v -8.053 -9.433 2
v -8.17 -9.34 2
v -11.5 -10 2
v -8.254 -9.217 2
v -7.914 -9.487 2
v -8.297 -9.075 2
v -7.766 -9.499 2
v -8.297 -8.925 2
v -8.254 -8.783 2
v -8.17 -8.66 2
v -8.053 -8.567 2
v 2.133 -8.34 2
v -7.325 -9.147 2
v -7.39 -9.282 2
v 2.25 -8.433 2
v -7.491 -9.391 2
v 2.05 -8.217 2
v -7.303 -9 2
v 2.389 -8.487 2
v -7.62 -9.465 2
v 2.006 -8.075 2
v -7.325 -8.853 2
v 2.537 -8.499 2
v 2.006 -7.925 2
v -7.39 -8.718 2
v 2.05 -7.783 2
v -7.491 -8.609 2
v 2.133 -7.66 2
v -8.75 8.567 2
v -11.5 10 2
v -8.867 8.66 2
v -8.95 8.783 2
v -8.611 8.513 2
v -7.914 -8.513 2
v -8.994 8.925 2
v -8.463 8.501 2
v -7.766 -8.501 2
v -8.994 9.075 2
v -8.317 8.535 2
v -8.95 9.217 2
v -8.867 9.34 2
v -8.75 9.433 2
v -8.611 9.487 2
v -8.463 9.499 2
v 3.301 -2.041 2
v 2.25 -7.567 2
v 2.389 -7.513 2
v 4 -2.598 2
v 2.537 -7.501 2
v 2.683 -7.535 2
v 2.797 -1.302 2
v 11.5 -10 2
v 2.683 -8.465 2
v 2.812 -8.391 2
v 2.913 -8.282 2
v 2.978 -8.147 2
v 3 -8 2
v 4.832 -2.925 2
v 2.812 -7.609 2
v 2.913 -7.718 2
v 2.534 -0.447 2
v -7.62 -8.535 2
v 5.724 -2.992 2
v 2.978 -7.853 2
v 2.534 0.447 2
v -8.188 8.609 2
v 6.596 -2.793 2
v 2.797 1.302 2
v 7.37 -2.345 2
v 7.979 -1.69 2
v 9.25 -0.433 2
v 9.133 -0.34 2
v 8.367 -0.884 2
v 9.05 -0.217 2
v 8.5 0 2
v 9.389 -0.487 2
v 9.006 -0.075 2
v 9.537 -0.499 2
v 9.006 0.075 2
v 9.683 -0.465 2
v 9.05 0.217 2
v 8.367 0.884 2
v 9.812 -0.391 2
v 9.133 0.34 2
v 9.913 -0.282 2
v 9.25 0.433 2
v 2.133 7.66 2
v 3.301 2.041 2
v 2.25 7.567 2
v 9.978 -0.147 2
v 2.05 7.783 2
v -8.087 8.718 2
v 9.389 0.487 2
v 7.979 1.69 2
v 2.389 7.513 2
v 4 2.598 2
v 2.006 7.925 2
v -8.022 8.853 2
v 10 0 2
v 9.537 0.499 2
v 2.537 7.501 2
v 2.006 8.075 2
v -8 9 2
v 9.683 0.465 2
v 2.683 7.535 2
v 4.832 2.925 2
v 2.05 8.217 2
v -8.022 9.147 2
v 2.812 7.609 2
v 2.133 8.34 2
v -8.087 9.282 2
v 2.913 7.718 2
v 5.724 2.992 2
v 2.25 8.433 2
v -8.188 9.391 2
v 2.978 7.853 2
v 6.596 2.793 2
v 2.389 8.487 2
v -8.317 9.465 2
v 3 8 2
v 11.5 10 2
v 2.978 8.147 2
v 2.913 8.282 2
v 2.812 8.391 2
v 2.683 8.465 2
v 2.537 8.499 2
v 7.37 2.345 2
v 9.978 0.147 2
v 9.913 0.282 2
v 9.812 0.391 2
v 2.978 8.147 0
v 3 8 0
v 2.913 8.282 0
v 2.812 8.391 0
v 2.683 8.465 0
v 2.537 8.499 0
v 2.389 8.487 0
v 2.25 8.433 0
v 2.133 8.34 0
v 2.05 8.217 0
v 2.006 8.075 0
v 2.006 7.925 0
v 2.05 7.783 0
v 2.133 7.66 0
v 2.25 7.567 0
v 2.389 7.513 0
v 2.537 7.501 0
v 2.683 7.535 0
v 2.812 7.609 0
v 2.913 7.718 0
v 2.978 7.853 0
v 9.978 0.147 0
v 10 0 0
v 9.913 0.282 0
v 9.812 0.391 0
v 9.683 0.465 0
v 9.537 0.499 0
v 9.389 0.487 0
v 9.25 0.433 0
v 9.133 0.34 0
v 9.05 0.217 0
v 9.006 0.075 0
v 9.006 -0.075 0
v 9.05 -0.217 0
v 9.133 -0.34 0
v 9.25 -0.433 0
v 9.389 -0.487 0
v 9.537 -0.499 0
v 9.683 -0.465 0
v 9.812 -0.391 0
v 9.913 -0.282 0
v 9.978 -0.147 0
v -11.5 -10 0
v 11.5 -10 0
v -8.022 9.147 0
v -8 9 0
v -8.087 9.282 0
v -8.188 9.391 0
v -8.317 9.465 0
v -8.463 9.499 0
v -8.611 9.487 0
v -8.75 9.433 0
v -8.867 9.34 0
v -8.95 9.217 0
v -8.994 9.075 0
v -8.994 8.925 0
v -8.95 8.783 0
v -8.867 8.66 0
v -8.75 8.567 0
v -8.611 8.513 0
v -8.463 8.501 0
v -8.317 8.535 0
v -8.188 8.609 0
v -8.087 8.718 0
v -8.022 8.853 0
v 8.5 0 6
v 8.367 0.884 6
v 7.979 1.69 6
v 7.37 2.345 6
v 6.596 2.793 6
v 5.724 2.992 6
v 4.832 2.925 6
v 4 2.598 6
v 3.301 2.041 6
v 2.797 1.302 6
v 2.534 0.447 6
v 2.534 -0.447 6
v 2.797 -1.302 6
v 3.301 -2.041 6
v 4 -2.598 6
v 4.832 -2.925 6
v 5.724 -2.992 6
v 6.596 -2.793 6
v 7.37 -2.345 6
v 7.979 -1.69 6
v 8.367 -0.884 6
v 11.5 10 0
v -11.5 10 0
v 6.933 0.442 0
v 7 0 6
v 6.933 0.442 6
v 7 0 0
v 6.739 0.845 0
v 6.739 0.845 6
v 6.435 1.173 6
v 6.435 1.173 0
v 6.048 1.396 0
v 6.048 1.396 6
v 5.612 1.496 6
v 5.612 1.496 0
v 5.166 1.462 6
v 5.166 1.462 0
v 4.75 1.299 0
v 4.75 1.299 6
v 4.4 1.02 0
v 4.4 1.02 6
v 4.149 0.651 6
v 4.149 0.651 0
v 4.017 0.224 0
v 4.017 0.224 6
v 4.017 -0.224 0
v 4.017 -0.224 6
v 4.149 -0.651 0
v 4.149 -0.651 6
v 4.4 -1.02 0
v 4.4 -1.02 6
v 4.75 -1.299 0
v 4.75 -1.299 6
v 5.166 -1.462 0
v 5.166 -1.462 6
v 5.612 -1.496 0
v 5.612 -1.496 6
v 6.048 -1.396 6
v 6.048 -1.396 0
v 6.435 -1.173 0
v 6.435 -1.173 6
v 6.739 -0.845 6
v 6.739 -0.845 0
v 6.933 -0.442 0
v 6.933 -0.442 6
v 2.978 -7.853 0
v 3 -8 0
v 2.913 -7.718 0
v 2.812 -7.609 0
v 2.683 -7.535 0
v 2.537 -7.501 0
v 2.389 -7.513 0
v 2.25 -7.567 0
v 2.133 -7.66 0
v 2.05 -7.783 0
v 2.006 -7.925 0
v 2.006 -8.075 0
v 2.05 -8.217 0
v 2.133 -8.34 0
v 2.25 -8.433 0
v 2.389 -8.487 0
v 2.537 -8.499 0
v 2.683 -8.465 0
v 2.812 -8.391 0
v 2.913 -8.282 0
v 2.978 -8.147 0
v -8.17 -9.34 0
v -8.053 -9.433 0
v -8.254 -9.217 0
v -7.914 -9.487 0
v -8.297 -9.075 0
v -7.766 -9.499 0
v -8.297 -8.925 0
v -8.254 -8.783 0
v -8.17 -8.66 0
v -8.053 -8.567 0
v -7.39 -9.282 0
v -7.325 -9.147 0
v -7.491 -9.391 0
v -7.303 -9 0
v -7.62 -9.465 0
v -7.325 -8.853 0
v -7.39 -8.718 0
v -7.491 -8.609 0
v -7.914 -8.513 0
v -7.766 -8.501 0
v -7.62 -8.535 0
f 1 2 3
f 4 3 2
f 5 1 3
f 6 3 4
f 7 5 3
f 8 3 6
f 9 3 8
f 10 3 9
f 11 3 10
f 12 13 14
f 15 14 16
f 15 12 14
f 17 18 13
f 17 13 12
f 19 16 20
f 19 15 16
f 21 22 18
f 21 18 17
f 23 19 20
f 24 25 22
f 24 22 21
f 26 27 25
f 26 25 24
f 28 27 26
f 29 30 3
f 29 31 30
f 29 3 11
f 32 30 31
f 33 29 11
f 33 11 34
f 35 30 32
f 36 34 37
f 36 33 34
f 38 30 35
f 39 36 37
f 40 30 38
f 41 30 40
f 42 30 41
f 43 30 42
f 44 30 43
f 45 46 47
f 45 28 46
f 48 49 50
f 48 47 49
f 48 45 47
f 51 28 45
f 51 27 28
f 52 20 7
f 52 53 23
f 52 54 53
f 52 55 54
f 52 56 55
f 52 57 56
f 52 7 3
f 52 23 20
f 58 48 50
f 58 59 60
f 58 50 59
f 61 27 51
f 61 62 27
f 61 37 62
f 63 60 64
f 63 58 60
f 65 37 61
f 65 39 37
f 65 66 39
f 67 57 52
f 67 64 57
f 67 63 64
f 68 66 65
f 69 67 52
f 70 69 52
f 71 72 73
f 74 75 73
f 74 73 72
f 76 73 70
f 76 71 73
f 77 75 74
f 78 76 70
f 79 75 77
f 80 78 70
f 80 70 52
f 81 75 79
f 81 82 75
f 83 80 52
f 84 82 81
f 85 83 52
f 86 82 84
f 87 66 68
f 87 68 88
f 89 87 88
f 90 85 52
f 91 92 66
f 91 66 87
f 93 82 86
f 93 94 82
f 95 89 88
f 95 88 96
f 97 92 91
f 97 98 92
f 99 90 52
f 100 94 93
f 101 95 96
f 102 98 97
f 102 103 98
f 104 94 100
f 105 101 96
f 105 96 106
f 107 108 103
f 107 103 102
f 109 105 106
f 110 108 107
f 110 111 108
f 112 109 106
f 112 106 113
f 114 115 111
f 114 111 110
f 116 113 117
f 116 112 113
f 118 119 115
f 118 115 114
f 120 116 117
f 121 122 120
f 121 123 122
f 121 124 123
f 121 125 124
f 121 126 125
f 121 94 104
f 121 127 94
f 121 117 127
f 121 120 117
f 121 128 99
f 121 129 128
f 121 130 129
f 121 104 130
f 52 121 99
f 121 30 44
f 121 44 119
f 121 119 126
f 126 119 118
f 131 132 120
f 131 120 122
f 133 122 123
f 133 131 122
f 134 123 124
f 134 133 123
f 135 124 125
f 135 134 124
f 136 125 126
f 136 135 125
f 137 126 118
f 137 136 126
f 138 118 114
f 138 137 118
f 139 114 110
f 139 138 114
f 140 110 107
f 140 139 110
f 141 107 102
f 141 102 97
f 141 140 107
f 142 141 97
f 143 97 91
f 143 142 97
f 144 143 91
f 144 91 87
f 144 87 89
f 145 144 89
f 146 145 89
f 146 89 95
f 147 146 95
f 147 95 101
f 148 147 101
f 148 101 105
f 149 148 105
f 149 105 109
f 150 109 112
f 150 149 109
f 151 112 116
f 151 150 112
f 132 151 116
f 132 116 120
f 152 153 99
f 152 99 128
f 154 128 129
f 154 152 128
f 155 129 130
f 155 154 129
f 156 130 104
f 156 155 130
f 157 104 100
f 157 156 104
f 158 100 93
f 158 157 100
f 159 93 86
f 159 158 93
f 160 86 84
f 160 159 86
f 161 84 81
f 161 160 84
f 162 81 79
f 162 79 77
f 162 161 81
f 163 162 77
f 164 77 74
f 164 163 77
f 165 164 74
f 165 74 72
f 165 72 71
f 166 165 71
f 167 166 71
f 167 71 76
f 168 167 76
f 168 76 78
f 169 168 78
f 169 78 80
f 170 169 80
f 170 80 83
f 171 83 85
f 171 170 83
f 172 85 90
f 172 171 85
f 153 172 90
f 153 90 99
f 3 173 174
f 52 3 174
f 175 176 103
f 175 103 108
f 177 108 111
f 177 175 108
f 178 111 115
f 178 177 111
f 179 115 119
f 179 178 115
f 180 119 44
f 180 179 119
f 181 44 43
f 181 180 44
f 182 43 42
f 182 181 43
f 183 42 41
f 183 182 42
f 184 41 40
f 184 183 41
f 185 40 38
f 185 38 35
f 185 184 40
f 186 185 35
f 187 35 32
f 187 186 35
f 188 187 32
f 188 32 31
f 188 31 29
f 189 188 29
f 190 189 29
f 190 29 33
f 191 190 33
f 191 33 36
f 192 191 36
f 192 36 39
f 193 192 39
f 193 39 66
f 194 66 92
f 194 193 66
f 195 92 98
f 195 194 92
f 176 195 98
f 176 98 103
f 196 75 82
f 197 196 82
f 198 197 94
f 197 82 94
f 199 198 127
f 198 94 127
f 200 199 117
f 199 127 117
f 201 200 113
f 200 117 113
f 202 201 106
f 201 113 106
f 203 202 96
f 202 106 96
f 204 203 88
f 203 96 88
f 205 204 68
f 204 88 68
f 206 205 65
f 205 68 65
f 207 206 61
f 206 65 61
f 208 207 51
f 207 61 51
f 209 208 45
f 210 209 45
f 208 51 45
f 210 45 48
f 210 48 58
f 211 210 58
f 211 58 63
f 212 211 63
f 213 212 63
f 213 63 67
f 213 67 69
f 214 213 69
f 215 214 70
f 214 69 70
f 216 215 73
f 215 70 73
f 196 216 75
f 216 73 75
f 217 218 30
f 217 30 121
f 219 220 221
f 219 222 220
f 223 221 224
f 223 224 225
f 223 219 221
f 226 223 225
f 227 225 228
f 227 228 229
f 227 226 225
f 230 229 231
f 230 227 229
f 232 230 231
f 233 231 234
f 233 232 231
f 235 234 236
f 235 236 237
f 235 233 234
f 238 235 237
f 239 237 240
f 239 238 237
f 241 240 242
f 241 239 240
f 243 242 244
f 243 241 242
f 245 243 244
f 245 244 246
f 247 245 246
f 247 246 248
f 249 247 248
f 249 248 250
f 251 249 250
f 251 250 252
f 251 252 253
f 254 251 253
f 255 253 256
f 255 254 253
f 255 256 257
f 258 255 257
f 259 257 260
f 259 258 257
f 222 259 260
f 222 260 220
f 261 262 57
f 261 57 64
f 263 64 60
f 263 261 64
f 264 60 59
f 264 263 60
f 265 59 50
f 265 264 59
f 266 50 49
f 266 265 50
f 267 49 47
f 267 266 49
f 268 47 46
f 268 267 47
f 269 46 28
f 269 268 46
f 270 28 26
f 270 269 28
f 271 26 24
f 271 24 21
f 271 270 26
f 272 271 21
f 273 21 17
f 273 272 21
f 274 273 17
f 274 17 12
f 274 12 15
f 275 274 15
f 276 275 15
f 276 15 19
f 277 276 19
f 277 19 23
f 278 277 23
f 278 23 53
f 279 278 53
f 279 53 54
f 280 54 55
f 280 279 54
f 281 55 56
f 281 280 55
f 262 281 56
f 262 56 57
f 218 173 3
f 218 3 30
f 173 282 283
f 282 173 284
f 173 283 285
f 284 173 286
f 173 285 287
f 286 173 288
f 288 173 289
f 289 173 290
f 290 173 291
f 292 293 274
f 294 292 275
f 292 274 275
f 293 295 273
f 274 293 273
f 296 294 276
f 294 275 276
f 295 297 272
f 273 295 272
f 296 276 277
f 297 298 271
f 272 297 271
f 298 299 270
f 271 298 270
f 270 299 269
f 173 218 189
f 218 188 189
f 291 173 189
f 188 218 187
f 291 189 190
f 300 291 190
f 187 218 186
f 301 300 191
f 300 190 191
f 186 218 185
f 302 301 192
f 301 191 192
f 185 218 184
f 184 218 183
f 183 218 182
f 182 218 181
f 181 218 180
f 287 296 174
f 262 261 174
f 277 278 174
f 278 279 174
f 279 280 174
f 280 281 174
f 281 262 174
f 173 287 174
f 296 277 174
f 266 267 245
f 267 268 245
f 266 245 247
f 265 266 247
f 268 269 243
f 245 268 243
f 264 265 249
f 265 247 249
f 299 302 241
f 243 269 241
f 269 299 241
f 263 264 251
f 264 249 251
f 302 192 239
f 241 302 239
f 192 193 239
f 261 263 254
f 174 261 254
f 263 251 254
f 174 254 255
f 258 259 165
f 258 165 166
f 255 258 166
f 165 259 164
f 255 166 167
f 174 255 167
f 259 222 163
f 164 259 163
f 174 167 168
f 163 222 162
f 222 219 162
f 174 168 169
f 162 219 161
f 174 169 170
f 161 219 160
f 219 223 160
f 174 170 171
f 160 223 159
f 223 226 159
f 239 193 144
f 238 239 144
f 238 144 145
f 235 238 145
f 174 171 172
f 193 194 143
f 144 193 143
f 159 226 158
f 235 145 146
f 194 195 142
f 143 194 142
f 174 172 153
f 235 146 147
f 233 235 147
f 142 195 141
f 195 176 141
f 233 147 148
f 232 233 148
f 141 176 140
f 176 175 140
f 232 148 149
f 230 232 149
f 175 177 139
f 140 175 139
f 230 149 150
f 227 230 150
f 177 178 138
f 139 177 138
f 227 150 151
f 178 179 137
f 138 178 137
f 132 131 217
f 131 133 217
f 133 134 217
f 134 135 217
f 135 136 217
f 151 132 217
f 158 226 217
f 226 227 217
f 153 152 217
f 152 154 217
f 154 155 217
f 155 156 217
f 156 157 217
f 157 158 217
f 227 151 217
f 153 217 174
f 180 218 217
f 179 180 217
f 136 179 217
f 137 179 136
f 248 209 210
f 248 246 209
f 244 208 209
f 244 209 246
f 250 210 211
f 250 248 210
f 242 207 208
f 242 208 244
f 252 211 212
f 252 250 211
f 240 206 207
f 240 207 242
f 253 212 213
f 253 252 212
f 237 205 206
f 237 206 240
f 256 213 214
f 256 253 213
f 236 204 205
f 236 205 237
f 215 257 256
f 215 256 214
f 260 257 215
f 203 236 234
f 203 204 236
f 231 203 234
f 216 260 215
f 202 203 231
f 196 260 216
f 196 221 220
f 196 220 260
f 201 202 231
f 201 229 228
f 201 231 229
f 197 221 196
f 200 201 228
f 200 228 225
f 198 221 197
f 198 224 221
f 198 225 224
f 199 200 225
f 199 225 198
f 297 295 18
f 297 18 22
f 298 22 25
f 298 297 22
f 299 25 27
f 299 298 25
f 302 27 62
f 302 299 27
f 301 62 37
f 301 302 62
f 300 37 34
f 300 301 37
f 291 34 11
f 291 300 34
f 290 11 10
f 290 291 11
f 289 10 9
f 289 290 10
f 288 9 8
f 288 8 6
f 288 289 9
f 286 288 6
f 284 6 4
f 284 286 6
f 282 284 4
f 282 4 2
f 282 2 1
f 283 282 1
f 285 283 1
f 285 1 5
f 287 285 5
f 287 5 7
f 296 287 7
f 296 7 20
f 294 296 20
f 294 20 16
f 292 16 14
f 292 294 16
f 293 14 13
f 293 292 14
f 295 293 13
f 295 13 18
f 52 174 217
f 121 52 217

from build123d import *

# Parameters (mm, degrees)
SKETCH_1_W      = 23
SKETCH_1_H      = 20
SKETCH_1_R      = 0.5
SKETCH_1_R_2    = 1.5
EXTRUDE_1_DEPTH = 2
SKETCH_2_R      = 3
SKETCH_2_R_2    = 1.5
EXTRUDE_2_DEPTH = 4


with BuildPart() as part:
    # 草图1 → 凸台-拉伸1 (new body)
    with BuildSketch(Plane.XY):
        Rectangle(SKETCH_1_W, SKETCH_1_H)
        with Locations((-8.5, 9)):
            Circle(SKETCH_1_R, mode=Mode.SUBTRACT)
        with Locations((-7.803030303, -9)):
            Circle(SKETCH_1_R, mode=Mode.SUBTRACT)
        with Locations((9.5, 0)):
            Circle(SKETCH_1_R, mode=Mode.SUBTRACT)
        with Locations((2.5, 8)):
            Circle(SKETCH_1_R, mode=Mode.SUBTRACT)
        with Locations((2.5, -8)):
            Circle(SKETCH_1_R, mode=Mode.SUBTRACT)
        with Locations((5.5, 0)):
            Circle(SKETCH_1_R_2, mode=Mode.SUBTRACT)
    extrude(amount=EXTRUDE_1_DEPTH)

    # 草图2 → 凸台-拉伸2 (add)
    with BuildSketch(Plane.XY.offset(2)):
        with Locations((5.5, 0)):
            Circle(SKETCH_2_R)
        with Locations((5.5, 0)):
            Circle(SKETCH_2_R_2, mode=Mode.SUBTRACT)
    extrude(amount=EXTRUDE_2_DEPTH)


solid = part.part
